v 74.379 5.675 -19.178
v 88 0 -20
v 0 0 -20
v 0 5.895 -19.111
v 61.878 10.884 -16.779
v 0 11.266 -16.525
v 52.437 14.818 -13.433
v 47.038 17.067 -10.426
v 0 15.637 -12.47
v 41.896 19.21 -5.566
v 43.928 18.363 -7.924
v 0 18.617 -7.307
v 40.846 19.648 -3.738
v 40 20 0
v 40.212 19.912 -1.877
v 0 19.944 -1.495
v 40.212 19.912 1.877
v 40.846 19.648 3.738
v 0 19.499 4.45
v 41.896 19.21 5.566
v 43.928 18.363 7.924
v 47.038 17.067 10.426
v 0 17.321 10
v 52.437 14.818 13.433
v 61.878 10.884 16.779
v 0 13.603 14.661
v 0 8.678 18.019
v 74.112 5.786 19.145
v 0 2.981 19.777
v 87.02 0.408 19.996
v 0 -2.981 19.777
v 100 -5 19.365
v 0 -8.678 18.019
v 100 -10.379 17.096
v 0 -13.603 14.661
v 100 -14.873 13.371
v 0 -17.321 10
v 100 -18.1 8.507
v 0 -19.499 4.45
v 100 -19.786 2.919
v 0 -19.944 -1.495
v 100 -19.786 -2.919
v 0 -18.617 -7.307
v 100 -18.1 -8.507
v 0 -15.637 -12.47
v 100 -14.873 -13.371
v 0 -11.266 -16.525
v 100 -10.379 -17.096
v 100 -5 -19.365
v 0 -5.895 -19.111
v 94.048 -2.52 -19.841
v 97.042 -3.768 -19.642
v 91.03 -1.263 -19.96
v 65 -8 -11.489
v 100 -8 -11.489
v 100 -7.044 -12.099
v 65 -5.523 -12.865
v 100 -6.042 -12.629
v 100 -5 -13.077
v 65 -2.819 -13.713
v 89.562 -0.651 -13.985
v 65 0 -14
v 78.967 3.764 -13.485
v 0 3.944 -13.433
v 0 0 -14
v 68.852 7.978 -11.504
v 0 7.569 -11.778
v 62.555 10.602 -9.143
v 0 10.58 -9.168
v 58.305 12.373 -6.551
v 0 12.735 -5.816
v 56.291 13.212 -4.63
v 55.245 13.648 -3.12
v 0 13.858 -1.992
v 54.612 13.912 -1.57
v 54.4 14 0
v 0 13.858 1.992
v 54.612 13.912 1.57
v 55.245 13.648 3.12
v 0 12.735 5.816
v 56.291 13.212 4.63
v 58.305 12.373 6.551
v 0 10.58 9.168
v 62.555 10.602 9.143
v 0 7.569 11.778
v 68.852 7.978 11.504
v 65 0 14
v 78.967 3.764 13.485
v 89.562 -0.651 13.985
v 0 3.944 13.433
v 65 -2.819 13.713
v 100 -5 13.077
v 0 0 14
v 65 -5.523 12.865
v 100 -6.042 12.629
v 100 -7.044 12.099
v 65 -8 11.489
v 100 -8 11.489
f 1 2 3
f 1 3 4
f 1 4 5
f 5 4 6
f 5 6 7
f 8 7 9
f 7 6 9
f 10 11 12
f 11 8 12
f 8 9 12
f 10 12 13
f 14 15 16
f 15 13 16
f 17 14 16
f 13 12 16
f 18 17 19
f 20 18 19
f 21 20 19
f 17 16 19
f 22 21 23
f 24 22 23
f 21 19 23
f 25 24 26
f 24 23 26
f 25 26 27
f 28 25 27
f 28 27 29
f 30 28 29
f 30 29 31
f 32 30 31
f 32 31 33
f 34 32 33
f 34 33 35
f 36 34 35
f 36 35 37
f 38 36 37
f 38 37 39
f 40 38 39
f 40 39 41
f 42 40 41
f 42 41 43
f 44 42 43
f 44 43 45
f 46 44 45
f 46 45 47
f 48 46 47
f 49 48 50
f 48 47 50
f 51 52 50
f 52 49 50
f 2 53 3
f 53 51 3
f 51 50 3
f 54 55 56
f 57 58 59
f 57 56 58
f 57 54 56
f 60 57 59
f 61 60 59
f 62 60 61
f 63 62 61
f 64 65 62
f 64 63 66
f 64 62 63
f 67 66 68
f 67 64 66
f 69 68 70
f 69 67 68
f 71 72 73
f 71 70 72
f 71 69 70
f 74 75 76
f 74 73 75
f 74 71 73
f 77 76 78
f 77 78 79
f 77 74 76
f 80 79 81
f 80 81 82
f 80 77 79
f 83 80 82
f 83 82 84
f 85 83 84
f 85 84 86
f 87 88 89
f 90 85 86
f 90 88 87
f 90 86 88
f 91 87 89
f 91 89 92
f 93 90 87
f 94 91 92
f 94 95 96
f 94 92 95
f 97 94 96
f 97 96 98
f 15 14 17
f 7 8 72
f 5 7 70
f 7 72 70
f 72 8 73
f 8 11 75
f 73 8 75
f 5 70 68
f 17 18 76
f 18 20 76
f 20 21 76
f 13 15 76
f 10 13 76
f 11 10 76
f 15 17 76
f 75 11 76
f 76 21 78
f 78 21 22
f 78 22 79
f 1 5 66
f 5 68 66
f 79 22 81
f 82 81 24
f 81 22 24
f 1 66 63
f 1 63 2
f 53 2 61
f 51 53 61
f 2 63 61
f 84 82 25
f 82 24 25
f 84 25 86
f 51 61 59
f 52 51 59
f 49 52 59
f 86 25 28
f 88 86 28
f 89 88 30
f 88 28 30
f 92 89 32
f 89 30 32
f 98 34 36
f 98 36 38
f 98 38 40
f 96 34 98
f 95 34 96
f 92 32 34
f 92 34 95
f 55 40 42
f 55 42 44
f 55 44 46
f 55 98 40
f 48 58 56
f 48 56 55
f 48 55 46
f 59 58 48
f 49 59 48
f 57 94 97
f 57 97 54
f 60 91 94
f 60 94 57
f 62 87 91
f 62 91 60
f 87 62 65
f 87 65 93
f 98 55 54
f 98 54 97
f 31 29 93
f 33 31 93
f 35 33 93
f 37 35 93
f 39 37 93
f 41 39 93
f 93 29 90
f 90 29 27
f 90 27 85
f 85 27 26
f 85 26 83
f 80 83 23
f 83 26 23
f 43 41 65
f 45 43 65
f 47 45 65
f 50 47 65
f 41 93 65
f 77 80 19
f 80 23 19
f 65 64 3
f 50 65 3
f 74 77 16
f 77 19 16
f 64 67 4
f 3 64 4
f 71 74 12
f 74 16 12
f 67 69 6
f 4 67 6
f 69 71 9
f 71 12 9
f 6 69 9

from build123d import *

# Parameters (mm, degrees)
BOSS_EXTRUDE1_DEPTH            = 65
SKETCH1_4_R                    = 20
BOSS_EXTRUDE2_DEPTH            = 100
CUT_EXTRUDE1_REACH             = 105.923
CUT_EXTRUDE1_DIRECTION_2_REACH = 105.923


with BuildPart() as part:
    # Sketch1 → Boss-Extrude1 (new body)
    with BuildSketch(Plane(origin=(0, 0, 0), x_dir=(0, 0, -1), z_dir=(1, 0, 0))):
        with BuildLine():
            Line((14, 0), (-14, 0))
            ThreePointArc((-14, 0), (-13.357540082, -4.192388692), (-11.489125293, -8))
            Line((-11.489125293, -8), (11.489125293, -8))
            ThreePointArc((11.489125293, -8), (13.357540082, -4.192388692), (14, 0))
        make_face()
    extrude(amount=BOSS_EXTRUDE1_DEPTH)

    # Sketch1<4> → Boss-Extrude2 (add)
    with BuildSketch(Plane(origin=(0, 0, 0), x_dir=(0, 0, -1), z_dir=(1, 0, 0))):
        Circle(SKETCH1_4_R)
        with BuildLine():
            Line((11.489125293, -8), (-11.489125293, -8))
            ThreePointArc((-11.489125293, -8), (0, 14), (11.489125293, -8))
        make_face(mode=Mode.SUBTRACT)
    extrude(amount=BOSS_EXTRUDE2_DEPTH)

    # Sketch2 → Cut-Extrude1 (cut, up to next)
    with BuildSketch(Plane.XY, mode=Mode.PRIVATE) as cut_extrude1_sk1:
        Polygon((40, 20), (100, -5), (100, 20), align=None)
    cut_extrude1_tool1 = extrude(cut_extrude1_sk1.sketch, amount=-CUT_EXTRUDE1_REACH, mode=Mode.PRIVATE) & part.part
    add(cut_extrude1_tool1.solids().sort_by_distance((80, 11.666667, 0))[0], mode=Mode.SUBTRACT)

    # Sketch2 → Cut-Extrude1 direction 2 (cut, up to next)
    with BuildSketch(Plane.XY, mode=Mode.PRIVATE) as cut_extrude1_direction_2_sk1:
        Polygon((40, 20), (100, -5), (100, 20), align=None)
    cut_extrude1_direction_2_tool1 = extrude(cut_extrude1_direction_2_sk1.sketch, amount=CUT_EXTRUDE1_DIRECTION_2_REACH, mode=Mode.PRIVATE) & part.part
    add(cut_extrude1_direction_2_tool1.solids().sort_by_distance((80, 11.666667, 0))[0], mode=Mode.SUBTRACT)


solid = part.part
